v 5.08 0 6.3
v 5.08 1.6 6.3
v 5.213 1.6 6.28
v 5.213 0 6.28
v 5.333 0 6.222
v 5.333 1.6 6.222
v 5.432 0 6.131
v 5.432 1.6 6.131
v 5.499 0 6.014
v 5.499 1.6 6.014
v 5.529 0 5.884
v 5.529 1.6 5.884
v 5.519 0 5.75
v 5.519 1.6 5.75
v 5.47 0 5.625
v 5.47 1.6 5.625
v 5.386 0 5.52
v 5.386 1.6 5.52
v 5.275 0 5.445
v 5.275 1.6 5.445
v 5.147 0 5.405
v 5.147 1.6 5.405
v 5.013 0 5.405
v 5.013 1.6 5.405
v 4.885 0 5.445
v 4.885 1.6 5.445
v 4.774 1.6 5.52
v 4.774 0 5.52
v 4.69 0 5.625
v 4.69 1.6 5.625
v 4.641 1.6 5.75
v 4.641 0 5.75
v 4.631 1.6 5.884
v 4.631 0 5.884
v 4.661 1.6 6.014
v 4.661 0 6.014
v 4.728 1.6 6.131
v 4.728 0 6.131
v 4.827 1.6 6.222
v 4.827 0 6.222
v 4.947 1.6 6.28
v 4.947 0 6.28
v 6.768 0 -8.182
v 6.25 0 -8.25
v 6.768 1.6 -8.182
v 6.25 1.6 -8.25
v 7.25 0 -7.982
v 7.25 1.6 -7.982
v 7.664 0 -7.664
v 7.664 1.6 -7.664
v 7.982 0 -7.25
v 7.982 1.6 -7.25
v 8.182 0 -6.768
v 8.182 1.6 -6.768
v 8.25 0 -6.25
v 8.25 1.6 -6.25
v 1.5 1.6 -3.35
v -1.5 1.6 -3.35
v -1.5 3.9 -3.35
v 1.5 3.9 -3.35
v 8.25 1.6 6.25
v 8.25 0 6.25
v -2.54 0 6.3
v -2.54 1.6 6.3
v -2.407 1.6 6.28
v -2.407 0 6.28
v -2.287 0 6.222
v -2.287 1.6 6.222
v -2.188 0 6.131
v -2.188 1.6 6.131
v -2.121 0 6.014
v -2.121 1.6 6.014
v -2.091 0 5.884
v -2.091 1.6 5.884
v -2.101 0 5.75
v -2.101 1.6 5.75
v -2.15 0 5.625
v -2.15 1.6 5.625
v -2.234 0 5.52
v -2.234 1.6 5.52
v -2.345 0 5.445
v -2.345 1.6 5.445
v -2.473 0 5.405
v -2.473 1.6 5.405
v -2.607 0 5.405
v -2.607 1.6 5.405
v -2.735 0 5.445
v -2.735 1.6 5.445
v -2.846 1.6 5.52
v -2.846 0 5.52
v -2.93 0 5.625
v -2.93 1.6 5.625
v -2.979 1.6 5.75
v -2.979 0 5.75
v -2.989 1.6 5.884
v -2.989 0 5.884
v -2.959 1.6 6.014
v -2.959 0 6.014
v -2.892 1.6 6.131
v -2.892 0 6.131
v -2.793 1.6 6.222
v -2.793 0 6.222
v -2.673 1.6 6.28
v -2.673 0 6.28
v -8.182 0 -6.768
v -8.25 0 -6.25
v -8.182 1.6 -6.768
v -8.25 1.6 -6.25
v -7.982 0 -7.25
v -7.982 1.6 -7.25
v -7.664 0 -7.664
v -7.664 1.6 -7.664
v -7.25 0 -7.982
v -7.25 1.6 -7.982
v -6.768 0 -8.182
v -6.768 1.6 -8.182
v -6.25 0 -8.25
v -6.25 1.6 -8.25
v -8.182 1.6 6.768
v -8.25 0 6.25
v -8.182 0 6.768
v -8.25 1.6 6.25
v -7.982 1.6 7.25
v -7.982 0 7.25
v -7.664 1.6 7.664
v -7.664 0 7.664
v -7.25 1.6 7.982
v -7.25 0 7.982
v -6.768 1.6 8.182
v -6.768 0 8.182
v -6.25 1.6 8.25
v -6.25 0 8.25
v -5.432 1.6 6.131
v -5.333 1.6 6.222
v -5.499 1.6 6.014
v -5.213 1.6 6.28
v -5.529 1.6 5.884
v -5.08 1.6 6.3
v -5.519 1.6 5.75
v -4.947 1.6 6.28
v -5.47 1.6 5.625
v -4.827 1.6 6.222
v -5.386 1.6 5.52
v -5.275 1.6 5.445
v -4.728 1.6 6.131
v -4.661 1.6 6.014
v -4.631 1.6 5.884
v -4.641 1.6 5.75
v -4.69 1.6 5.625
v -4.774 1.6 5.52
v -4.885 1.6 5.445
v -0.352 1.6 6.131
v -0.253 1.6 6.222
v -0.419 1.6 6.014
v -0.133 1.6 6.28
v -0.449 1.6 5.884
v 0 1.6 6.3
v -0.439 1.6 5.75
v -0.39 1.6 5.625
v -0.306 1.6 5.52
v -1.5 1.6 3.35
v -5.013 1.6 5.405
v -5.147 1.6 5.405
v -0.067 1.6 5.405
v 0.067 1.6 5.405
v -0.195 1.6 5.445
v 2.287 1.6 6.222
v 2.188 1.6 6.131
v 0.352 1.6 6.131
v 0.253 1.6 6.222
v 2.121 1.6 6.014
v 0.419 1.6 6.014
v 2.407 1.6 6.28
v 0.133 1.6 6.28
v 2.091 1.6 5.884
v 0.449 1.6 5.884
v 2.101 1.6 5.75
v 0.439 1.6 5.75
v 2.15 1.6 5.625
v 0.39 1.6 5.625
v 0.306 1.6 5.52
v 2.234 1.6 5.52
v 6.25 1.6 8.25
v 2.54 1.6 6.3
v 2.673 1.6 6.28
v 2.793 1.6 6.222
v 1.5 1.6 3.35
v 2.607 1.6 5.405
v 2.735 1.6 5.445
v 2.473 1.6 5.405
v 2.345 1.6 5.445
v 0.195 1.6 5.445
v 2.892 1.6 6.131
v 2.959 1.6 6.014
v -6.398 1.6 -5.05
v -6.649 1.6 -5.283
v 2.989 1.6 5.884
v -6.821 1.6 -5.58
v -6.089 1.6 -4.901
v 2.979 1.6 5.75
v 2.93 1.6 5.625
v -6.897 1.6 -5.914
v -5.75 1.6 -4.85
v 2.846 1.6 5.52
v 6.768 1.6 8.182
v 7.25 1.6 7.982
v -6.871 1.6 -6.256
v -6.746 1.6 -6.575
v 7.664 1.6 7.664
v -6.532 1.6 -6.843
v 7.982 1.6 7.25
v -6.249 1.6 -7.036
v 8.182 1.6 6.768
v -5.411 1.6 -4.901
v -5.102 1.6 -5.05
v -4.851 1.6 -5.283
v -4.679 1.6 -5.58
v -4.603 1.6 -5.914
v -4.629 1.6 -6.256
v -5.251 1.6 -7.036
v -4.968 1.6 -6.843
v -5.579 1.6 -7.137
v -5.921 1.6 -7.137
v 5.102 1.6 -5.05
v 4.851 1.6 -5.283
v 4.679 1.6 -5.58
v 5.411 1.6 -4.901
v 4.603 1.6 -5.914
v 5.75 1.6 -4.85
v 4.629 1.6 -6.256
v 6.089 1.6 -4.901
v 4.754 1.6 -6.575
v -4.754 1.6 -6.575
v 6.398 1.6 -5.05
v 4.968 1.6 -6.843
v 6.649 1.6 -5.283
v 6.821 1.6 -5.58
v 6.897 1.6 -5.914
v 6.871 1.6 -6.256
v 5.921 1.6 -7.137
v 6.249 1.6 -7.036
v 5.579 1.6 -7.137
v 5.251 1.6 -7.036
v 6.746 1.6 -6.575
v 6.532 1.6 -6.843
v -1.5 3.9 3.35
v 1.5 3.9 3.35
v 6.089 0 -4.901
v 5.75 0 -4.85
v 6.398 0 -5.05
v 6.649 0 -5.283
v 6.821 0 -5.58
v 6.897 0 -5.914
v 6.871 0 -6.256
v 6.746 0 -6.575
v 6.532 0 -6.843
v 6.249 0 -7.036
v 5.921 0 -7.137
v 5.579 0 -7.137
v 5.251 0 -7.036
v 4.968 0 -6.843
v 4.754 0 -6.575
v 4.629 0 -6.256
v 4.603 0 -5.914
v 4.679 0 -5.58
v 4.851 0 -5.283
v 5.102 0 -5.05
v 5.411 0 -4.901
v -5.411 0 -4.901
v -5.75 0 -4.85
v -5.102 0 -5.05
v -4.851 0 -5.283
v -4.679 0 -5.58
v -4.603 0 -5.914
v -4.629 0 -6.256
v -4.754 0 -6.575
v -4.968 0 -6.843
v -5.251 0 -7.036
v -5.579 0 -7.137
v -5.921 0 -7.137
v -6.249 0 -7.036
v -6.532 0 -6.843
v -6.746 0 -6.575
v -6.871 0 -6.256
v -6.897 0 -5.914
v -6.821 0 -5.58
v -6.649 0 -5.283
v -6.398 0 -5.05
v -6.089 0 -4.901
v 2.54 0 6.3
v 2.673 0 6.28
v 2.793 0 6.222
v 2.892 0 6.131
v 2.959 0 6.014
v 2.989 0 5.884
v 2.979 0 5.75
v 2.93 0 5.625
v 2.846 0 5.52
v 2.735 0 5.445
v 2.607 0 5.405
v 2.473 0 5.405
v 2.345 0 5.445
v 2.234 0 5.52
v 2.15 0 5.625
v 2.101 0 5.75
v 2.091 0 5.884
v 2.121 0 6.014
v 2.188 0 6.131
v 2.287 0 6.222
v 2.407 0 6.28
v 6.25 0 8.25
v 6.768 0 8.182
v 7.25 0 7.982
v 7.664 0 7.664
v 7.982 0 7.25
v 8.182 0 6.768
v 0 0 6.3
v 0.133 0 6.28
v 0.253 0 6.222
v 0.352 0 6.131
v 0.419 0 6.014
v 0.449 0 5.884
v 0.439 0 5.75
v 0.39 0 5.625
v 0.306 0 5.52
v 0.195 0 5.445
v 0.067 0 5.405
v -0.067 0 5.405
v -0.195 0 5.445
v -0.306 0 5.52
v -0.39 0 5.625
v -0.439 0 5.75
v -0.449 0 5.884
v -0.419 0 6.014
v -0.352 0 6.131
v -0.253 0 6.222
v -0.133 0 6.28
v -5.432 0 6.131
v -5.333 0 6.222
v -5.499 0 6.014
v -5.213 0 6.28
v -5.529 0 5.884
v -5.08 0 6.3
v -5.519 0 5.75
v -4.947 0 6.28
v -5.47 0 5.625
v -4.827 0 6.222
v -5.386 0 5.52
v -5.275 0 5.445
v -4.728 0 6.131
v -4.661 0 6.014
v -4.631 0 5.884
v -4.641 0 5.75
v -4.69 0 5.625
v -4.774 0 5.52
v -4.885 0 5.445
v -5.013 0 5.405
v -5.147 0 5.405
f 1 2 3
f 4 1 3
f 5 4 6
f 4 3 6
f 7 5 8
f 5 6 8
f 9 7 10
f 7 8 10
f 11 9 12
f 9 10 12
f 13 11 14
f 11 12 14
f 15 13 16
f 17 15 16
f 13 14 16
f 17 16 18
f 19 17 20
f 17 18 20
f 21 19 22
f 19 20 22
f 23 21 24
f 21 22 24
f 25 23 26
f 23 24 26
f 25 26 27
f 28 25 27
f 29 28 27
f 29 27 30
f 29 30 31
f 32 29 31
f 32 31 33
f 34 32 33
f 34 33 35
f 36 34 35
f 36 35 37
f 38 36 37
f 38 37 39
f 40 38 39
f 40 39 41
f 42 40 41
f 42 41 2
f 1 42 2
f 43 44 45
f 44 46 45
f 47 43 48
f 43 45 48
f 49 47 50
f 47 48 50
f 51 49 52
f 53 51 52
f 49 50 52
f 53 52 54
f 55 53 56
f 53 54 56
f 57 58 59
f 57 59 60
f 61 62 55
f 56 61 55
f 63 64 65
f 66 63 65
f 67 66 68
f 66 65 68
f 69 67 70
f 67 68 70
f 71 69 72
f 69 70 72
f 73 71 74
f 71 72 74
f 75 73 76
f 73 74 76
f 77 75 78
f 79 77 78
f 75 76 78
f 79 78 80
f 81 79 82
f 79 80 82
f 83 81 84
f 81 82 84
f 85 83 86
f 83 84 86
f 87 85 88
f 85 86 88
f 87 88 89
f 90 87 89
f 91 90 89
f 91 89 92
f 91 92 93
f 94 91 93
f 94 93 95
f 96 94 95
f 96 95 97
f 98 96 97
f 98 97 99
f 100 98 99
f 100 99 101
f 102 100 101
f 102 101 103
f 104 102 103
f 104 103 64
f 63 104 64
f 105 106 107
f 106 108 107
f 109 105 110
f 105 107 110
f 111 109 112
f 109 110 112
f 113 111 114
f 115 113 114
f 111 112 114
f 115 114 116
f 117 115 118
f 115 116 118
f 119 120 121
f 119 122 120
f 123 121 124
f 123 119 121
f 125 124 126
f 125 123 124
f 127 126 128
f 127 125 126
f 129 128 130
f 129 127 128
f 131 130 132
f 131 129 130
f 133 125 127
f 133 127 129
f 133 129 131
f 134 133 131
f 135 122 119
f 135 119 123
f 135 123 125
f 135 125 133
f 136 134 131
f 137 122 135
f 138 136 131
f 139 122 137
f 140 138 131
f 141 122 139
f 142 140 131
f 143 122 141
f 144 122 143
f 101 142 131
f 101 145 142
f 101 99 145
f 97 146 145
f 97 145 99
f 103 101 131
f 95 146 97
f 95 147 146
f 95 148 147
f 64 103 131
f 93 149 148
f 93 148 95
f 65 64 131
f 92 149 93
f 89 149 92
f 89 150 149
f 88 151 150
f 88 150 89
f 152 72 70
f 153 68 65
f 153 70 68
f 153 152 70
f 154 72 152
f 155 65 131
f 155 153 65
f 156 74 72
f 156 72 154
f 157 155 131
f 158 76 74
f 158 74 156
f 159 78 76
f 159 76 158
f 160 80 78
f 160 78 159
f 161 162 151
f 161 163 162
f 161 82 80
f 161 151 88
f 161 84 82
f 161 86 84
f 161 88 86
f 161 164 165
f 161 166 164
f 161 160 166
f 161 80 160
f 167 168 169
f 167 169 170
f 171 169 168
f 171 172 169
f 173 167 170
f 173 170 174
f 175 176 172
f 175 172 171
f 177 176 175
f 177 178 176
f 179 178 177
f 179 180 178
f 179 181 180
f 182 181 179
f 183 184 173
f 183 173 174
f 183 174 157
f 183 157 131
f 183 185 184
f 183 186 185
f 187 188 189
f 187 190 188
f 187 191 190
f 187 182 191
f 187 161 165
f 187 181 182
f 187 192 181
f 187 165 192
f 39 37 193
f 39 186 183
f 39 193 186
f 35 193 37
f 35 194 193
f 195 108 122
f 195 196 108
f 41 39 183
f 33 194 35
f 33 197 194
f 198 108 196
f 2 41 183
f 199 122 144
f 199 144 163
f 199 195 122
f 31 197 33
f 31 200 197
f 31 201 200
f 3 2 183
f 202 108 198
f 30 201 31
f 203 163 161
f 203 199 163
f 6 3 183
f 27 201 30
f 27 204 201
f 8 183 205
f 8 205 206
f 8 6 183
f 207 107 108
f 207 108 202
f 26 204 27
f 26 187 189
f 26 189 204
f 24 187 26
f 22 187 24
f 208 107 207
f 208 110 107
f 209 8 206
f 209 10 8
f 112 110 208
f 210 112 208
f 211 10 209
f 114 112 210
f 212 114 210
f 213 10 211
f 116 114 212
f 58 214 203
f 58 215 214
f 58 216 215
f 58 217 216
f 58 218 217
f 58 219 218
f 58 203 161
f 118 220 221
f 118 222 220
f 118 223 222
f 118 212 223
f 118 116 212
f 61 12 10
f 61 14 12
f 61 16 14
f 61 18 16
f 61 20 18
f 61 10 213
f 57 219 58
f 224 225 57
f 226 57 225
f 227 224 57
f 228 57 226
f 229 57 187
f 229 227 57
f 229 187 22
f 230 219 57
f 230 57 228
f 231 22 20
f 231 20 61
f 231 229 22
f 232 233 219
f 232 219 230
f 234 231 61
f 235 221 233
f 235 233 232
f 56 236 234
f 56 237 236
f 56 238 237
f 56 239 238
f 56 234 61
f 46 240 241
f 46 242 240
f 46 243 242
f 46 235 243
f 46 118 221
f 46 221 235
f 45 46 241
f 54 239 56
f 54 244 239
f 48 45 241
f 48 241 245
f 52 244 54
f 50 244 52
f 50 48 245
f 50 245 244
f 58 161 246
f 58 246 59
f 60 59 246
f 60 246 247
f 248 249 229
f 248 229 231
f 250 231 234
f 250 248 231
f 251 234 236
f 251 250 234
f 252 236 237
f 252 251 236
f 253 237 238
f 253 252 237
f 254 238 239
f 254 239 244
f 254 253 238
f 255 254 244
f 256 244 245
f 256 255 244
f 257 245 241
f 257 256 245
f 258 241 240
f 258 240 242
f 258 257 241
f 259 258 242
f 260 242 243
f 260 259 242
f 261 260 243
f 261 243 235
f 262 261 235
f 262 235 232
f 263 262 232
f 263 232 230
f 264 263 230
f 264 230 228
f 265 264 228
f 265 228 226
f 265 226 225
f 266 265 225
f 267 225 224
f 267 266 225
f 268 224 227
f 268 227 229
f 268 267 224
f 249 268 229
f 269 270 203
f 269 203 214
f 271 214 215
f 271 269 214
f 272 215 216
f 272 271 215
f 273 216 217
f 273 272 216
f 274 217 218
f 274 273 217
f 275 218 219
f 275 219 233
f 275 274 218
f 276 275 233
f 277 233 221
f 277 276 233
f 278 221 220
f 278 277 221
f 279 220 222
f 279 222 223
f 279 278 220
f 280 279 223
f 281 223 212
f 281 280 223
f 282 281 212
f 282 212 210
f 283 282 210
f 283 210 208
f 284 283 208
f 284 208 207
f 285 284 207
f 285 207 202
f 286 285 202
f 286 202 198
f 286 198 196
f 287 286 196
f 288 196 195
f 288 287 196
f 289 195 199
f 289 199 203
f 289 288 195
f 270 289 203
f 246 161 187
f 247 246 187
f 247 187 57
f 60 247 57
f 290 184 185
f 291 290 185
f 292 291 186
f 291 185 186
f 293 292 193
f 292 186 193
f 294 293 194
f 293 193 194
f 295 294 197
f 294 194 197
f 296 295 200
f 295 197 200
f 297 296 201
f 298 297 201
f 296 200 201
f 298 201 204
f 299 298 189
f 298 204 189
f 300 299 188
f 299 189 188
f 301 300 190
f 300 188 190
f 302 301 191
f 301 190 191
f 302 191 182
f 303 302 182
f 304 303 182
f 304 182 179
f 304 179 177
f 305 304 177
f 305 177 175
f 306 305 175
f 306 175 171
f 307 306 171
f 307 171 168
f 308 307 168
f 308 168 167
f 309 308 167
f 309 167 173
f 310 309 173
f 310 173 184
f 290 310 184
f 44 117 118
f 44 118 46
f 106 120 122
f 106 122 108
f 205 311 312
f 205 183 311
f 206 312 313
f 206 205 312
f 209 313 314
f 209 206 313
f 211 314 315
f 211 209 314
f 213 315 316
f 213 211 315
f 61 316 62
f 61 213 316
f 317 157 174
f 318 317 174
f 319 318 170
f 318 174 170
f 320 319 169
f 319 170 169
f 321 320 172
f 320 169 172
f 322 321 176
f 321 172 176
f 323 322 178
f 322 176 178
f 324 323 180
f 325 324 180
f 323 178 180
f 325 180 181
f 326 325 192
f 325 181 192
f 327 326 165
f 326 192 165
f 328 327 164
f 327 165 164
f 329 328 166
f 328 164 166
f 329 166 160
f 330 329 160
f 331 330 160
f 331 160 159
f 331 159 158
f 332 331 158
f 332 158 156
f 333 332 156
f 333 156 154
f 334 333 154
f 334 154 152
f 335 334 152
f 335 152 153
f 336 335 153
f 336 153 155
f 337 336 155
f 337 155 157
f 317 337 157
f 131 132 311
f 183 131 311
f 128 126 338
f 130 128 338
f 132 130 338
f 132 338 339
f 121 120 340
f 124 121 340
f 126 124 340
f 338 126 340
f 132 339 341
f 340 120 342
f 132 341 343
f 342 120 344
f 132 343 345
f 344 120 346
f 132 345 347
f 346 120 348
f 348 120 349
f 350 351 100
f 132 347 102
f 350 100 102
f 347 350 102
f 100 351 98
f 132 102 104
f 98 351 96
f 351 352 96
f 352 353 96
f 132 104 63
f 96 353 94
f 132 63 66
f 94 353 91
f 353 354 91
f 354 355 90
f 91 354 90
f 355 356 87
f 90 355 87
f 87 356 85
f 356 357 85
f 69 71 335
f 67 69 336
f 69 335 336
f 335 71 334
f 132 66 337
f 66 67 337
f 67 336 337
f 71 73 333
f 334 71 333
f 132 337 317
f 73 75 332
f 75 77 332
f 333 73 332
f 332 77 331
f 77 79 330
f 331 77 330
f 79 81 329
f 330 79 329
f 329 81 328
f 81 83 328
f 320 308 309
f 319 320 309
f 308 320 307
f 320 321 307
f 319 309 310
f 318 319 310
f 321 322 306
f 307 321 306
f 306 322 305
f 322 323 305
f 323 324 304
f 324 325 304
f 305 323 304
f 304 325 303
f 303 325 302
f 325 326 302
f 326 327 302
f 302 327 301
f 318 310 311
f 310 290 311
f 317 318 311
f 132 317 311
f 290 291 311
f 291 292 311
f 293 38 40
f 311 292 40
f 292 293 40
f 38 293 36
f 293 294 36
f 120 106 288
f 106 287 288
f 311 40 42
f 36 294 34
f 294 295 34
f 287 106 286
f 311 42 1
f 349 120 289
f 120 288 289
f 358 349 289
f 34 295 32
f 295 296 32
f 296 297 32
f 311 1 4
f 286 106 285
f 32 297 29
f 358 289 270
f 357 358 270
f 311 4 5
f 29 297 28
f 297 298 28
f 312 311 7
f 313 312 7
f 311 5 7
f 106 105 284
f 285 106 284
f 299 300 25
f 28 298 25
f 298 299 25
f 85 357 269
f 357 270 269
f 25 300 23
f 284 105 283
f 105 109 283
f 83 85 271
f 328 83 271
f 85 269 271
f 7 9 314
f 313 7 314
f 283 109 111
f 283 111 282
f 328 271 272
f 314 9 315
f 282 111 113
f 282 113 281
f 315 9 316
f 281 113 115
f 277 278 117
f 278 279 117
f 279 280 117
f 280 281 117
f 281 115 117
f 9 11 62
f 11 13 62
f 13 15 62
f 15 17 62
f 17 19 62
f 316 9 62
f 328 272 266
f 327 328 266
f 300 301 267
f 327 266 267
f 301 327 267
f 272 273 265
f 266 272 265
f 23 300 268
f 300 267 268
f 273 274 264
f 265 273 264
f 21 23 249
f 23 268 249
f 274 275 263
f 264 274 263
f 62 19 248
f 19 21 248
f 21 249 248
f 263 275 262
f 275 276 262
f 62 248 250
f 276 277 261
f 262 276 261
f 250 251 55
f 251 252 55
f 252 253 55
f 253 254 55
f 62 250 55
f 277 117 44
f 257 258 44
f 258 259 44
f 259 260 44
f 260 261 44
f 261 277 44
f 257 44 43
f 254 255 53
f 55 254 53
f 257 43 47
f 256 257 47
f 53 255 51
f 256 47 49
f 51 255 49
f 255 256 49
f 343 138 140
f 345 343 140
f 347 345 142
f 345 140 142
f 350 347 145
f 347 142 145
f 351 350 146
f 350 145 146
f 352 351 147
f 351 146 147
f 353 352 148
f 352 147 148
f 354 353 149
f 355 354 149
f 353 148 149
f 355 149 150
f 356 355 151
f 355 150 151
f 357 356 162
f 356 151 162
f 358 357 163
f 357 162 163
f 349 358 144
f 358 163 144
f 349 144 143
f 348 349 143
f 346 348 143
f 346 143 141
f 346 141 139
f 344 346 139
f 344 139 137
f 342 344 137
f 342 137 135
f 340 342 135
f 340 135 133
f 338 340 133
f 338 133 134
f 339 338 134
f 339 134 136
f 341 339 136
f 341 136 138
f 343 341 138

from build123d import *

# Parameters (mm, degrees)
SKETCH1_W           = 16.5
SKETCH1_H           = 16.5
SKETCH1_R           = 1.15
BOSS_EXTRUDE1_DEPTH = 1.6
SKETCH2_W           = 3
SKETCH2_H           = 6.7
BOSS_EXTRUDE2_DEPTH = 2.3
BOSS_EXTRUDE4_DEPTH = 0.3
LPATTERN1_COUNT     = 3
LPATTERN1_PITCH     = 2.54
LPATTERN1_2_COUNT   = 3
LPATTERN1_2_PITCH   = 2.54
SKETCH6_R           = 0.45
CUT_EXTRUDE1_DEPTH  = 18.878216494
FILLET1_R           = 2


with BuildPart() as part:
    # Sketch1 → Boss-Extrude1 (new body)
    with BuildSketch(Plane(origin=(0, 0, 0), x_dir=(1, 0, 0), z_dir=(0, 1, 0))):
        Rectangle(SKETCH1_W, SKETCH1_H)
        with Locations(Location((-5.75, 6, 0), (0, 0, 270))):
            Circle(SKETCH1_R, mode=Mode.SUBTRACT)
        with Locations(Location((5.75, 6, 0), (0, 0, 270))):
            Circle(SKETCH1_R, mode=Mode.SUBTRACT)
    extrude(amount=BOSS_EXTRUDE1_DEPTH)

    # Sketch2 → Boss-Extrude2 (add)
    with BuildSketch(Plane(origin=(0, 1.6, 0), x_dir=(1, 0, 0), z_dir=(0, 1, 0))):
        Rectangle(SKETCH2_W, SKETCH2_H)
    extrude(amount=BOSS_EXTRUDE2_DEPTH)

    # Sketch6 → Cut-Extrude1 (cut, through all)
    with BuildSketch(Plane(origin=(0, 1.6, 0), x_dir=(1, 0, 0), z_dir=(0, 1, 0))):
        with Locations(Location((-5.08, -5.85, 0), (0, 0, 270))):
            Circle(SKETCH6_R)
        with Locations(Location((-2.54, -5.85, 0), (0, 0, 270))):
            Circle(SKETCH6_R)
        with Locations(Location((0, -5.85, 0), (0, 0, 270))):
            Circle(SKETCH6_R)
        with Locations(Location((2.54, -5.85, 0), (0, 0, 270))):
            Circle(SKETCH6_R)
        with Locations(Location((5.08, -5.85, 0), (0, 0, 270))):
            Circle(SKETCH6_R)
    extrude(amount=-CUT_EXTRUDE1_DEPTH, mode=Mode.SUBTRACT)

    # Fillet1
    fillet1_edges = [part.edges().sort_by_distance(p)[0] for p in [
        (8.25, 0.8, 8.25),
        (-8.25, 0.8, 8.25),
        (-8.25, 0.8, -8.25),
        (8.25, 0.8, -8.25),
    ]]
    fillet(fillet1_edges, radius=FILLET1_R)


with BuildPart() as body_2:
    # Sketch4 → Boss-Extrude4 (new, symmetric)
    with BuildSketch(Plane(origin=(0, 0, 0), x_dir=(0, 0, -1), z_dir=(1, 0, 0))):
        with BuildLine():
            Line((-6.15, 0), (-6.15, -0.425))
            ThreePointArc((-6.15, -0.425), (-6.296446609, -0.778553391), (-6.65, -0.925))
            Line((-6.65, -0.925), (-15.55, -0.925))
            Line((-15.55, -0.925), (-15.55, -1.525))
            Line((-15.55, -1.525), (-6.65, -1.525))
            ThreePointArc((-6.65, -1.525), (-5.872182541, -1.202817459), (-5.55, -0.425))
            Line((-5.55, -0.425), (-5.55, 0))
            Line((-5.55, 0), (-6.15, 0))
        make_face()
    extrude(amount=BOSS_EXTRUDE4_DEPTH, both=True)


with BuildPart() as lpattern1_1:
    # LPattern1: pattern copy
    add(body_2.part.moved(Location(Vector(1, 0, 0) * (1 * LPATTERN1_PITCH))))


with BuildPart() as lpattern1_2:
    # LPattern1: pattern copy
    add(body_2.part.moved(Location(Vector(1, 0, 0) * (2 * LPATTERN1_PITCH))))


with BuildPart() as lpattern1_2_1:
    # LPattern1 2: pattern copy
    add(body_2.part.moved(Location(Vector(-1, 0, 0) * (1 * LPATTERN1_2_PITCH))))


with BuildPart() as lpattern1_2_2:
    # LPattern1 2: pattern copy
    add(body_2.part.moved(Location(Vector(-1, 0, 0) * (2 * LPATTERN1_2_PITCH))))


solid = part.part
